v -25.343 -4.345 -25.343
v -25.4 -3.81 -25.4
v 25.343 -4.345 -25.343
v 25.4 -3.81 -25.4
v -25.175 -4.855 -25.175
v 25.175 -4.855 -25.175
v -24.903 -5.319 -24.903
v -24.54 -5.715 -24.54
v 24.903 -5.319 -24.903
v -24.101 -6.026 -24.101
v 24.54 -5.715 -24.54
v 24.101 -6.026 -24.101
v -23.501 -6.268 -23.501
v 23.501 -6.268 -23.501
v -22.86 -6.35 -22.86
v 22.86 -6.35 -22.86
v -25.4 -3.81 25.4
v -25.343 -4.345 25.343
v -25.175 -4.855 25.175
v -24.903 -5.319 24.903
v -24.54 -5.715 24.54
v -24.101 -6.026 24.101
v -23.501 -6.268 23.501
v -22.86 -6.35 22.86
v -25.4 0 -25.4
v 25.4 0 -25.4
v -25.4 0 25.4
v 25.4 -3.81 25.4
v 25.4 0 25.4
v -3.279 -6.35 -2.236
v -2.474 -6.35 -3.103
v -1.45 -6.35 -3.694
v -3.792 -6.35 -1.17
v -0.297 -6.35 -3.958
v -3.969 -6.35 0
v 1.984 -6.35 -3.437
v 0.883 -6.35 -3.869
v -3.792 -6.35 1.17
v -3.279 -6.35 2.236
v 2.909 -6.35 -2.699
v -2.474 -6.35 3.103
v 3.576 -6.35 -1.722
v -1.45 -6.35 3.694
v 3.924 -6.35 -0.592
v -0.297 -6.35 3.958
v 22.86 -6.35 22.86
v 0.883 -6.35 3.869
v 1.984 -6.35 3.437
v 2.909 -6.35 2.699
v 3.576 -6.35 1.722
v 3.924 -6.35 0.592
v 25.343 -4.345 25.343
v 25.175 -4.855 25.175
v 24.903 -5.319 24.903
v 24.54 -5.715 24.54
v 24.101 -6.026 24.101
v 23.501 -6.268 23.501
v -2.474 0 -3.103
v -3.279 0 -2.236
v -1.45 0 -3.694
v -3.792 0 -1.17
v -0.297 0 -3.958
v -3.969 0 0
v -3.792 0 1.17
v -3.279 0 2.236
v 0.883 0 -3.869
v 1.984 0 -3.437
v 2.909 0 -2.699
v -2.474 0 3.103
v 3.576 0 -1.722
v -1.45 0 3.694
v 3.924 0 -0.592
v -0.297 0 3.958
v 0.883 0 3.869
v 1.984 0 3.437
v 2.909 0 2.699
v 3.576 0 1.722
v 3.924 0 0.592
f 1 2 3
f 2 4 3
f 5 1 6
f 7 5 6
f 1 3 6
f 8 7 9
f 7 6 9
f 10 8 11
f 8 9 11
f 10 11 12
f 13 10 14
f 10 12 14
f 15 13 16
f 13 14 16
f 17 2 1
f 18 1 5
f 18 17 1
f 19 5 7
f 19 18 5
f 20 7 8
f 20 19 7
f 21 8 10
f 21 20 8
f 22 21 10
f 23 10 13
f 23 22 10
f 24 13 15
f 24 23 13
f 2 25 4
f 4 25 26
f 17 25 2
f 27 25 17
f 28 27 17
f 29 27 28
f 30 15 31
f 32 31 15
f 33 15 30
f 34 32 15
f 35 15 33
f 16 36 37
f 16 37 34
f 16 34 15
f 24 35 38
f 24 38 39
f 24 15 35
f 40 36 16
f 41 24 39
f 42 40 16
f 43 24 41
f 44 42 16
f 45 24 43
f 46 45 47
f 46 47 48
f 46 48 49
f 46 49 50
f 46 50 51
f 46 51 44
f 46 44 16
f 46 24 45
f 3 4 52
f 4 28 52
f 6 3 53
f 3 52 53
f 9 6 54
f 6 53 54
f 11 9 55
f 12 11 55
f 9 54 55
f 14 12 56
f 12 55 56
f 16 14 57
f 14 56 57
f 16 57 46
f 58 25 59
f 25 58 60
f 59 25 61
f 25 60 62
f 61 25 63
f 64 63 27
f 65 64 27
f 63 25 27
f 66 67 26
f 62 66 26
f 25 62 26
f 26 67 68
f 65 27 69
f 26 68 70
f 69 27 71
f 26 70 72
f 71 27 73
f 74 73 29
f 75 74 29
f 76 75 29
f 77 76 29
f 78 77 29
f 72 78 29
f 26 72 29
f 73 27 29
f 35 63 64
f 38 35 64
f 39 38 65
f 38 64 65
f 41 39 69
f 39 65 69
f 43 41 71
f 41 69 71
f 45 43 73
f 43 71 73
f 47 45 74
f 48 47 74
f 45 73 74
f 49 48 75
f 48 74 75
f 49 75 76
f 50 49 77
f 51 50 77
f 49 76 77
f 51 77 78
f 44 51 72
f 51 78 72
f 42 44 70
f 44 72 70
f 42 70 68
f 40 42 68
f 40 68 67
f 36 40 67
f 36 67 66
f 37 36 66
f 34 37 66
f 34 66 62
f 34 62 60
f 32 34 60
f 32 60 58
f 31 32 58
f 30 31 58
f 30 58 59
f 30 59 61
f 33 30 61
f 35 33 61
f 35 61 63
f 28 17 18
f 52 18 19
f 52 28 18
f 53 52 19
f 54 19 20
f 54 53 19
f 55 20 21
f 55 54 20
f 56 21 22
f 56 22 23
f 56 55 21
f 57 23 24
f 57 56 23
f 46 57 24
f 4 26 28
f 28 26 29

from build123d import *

# Parameters (mm, degrees)
F0_W     = 50.8
F0_H     = 50.8
F1_DEPTH = 6.35
F2_R     = 2.54
F4_D     = 7.9375


with BuildPart() as f1:
    # F0 (on Front) → F1 (new body)
    with BuildSketch(Plane.XZ):
        Rectangle(F0_W, F0_H)
    extrude(amount=F1_DEPTH)

    # F2
    f2_edges = [f1.edges().sort_by_distance(p)[0] for p in [
        (25.4, -6.35, 0),
        (0, -6.35, -25.4),
        (-25.4, -6.35, 0),
        (0, -6.35, 25.4),
    ]]
    fillet(f2_edges, radius=F2_R)

    # F4 (through all)
    with Locations(Plane.XZ.offset(6.35)):
        with Locations((0, 0)):
            Hole(F4_D / 2)


solid = f1.part
